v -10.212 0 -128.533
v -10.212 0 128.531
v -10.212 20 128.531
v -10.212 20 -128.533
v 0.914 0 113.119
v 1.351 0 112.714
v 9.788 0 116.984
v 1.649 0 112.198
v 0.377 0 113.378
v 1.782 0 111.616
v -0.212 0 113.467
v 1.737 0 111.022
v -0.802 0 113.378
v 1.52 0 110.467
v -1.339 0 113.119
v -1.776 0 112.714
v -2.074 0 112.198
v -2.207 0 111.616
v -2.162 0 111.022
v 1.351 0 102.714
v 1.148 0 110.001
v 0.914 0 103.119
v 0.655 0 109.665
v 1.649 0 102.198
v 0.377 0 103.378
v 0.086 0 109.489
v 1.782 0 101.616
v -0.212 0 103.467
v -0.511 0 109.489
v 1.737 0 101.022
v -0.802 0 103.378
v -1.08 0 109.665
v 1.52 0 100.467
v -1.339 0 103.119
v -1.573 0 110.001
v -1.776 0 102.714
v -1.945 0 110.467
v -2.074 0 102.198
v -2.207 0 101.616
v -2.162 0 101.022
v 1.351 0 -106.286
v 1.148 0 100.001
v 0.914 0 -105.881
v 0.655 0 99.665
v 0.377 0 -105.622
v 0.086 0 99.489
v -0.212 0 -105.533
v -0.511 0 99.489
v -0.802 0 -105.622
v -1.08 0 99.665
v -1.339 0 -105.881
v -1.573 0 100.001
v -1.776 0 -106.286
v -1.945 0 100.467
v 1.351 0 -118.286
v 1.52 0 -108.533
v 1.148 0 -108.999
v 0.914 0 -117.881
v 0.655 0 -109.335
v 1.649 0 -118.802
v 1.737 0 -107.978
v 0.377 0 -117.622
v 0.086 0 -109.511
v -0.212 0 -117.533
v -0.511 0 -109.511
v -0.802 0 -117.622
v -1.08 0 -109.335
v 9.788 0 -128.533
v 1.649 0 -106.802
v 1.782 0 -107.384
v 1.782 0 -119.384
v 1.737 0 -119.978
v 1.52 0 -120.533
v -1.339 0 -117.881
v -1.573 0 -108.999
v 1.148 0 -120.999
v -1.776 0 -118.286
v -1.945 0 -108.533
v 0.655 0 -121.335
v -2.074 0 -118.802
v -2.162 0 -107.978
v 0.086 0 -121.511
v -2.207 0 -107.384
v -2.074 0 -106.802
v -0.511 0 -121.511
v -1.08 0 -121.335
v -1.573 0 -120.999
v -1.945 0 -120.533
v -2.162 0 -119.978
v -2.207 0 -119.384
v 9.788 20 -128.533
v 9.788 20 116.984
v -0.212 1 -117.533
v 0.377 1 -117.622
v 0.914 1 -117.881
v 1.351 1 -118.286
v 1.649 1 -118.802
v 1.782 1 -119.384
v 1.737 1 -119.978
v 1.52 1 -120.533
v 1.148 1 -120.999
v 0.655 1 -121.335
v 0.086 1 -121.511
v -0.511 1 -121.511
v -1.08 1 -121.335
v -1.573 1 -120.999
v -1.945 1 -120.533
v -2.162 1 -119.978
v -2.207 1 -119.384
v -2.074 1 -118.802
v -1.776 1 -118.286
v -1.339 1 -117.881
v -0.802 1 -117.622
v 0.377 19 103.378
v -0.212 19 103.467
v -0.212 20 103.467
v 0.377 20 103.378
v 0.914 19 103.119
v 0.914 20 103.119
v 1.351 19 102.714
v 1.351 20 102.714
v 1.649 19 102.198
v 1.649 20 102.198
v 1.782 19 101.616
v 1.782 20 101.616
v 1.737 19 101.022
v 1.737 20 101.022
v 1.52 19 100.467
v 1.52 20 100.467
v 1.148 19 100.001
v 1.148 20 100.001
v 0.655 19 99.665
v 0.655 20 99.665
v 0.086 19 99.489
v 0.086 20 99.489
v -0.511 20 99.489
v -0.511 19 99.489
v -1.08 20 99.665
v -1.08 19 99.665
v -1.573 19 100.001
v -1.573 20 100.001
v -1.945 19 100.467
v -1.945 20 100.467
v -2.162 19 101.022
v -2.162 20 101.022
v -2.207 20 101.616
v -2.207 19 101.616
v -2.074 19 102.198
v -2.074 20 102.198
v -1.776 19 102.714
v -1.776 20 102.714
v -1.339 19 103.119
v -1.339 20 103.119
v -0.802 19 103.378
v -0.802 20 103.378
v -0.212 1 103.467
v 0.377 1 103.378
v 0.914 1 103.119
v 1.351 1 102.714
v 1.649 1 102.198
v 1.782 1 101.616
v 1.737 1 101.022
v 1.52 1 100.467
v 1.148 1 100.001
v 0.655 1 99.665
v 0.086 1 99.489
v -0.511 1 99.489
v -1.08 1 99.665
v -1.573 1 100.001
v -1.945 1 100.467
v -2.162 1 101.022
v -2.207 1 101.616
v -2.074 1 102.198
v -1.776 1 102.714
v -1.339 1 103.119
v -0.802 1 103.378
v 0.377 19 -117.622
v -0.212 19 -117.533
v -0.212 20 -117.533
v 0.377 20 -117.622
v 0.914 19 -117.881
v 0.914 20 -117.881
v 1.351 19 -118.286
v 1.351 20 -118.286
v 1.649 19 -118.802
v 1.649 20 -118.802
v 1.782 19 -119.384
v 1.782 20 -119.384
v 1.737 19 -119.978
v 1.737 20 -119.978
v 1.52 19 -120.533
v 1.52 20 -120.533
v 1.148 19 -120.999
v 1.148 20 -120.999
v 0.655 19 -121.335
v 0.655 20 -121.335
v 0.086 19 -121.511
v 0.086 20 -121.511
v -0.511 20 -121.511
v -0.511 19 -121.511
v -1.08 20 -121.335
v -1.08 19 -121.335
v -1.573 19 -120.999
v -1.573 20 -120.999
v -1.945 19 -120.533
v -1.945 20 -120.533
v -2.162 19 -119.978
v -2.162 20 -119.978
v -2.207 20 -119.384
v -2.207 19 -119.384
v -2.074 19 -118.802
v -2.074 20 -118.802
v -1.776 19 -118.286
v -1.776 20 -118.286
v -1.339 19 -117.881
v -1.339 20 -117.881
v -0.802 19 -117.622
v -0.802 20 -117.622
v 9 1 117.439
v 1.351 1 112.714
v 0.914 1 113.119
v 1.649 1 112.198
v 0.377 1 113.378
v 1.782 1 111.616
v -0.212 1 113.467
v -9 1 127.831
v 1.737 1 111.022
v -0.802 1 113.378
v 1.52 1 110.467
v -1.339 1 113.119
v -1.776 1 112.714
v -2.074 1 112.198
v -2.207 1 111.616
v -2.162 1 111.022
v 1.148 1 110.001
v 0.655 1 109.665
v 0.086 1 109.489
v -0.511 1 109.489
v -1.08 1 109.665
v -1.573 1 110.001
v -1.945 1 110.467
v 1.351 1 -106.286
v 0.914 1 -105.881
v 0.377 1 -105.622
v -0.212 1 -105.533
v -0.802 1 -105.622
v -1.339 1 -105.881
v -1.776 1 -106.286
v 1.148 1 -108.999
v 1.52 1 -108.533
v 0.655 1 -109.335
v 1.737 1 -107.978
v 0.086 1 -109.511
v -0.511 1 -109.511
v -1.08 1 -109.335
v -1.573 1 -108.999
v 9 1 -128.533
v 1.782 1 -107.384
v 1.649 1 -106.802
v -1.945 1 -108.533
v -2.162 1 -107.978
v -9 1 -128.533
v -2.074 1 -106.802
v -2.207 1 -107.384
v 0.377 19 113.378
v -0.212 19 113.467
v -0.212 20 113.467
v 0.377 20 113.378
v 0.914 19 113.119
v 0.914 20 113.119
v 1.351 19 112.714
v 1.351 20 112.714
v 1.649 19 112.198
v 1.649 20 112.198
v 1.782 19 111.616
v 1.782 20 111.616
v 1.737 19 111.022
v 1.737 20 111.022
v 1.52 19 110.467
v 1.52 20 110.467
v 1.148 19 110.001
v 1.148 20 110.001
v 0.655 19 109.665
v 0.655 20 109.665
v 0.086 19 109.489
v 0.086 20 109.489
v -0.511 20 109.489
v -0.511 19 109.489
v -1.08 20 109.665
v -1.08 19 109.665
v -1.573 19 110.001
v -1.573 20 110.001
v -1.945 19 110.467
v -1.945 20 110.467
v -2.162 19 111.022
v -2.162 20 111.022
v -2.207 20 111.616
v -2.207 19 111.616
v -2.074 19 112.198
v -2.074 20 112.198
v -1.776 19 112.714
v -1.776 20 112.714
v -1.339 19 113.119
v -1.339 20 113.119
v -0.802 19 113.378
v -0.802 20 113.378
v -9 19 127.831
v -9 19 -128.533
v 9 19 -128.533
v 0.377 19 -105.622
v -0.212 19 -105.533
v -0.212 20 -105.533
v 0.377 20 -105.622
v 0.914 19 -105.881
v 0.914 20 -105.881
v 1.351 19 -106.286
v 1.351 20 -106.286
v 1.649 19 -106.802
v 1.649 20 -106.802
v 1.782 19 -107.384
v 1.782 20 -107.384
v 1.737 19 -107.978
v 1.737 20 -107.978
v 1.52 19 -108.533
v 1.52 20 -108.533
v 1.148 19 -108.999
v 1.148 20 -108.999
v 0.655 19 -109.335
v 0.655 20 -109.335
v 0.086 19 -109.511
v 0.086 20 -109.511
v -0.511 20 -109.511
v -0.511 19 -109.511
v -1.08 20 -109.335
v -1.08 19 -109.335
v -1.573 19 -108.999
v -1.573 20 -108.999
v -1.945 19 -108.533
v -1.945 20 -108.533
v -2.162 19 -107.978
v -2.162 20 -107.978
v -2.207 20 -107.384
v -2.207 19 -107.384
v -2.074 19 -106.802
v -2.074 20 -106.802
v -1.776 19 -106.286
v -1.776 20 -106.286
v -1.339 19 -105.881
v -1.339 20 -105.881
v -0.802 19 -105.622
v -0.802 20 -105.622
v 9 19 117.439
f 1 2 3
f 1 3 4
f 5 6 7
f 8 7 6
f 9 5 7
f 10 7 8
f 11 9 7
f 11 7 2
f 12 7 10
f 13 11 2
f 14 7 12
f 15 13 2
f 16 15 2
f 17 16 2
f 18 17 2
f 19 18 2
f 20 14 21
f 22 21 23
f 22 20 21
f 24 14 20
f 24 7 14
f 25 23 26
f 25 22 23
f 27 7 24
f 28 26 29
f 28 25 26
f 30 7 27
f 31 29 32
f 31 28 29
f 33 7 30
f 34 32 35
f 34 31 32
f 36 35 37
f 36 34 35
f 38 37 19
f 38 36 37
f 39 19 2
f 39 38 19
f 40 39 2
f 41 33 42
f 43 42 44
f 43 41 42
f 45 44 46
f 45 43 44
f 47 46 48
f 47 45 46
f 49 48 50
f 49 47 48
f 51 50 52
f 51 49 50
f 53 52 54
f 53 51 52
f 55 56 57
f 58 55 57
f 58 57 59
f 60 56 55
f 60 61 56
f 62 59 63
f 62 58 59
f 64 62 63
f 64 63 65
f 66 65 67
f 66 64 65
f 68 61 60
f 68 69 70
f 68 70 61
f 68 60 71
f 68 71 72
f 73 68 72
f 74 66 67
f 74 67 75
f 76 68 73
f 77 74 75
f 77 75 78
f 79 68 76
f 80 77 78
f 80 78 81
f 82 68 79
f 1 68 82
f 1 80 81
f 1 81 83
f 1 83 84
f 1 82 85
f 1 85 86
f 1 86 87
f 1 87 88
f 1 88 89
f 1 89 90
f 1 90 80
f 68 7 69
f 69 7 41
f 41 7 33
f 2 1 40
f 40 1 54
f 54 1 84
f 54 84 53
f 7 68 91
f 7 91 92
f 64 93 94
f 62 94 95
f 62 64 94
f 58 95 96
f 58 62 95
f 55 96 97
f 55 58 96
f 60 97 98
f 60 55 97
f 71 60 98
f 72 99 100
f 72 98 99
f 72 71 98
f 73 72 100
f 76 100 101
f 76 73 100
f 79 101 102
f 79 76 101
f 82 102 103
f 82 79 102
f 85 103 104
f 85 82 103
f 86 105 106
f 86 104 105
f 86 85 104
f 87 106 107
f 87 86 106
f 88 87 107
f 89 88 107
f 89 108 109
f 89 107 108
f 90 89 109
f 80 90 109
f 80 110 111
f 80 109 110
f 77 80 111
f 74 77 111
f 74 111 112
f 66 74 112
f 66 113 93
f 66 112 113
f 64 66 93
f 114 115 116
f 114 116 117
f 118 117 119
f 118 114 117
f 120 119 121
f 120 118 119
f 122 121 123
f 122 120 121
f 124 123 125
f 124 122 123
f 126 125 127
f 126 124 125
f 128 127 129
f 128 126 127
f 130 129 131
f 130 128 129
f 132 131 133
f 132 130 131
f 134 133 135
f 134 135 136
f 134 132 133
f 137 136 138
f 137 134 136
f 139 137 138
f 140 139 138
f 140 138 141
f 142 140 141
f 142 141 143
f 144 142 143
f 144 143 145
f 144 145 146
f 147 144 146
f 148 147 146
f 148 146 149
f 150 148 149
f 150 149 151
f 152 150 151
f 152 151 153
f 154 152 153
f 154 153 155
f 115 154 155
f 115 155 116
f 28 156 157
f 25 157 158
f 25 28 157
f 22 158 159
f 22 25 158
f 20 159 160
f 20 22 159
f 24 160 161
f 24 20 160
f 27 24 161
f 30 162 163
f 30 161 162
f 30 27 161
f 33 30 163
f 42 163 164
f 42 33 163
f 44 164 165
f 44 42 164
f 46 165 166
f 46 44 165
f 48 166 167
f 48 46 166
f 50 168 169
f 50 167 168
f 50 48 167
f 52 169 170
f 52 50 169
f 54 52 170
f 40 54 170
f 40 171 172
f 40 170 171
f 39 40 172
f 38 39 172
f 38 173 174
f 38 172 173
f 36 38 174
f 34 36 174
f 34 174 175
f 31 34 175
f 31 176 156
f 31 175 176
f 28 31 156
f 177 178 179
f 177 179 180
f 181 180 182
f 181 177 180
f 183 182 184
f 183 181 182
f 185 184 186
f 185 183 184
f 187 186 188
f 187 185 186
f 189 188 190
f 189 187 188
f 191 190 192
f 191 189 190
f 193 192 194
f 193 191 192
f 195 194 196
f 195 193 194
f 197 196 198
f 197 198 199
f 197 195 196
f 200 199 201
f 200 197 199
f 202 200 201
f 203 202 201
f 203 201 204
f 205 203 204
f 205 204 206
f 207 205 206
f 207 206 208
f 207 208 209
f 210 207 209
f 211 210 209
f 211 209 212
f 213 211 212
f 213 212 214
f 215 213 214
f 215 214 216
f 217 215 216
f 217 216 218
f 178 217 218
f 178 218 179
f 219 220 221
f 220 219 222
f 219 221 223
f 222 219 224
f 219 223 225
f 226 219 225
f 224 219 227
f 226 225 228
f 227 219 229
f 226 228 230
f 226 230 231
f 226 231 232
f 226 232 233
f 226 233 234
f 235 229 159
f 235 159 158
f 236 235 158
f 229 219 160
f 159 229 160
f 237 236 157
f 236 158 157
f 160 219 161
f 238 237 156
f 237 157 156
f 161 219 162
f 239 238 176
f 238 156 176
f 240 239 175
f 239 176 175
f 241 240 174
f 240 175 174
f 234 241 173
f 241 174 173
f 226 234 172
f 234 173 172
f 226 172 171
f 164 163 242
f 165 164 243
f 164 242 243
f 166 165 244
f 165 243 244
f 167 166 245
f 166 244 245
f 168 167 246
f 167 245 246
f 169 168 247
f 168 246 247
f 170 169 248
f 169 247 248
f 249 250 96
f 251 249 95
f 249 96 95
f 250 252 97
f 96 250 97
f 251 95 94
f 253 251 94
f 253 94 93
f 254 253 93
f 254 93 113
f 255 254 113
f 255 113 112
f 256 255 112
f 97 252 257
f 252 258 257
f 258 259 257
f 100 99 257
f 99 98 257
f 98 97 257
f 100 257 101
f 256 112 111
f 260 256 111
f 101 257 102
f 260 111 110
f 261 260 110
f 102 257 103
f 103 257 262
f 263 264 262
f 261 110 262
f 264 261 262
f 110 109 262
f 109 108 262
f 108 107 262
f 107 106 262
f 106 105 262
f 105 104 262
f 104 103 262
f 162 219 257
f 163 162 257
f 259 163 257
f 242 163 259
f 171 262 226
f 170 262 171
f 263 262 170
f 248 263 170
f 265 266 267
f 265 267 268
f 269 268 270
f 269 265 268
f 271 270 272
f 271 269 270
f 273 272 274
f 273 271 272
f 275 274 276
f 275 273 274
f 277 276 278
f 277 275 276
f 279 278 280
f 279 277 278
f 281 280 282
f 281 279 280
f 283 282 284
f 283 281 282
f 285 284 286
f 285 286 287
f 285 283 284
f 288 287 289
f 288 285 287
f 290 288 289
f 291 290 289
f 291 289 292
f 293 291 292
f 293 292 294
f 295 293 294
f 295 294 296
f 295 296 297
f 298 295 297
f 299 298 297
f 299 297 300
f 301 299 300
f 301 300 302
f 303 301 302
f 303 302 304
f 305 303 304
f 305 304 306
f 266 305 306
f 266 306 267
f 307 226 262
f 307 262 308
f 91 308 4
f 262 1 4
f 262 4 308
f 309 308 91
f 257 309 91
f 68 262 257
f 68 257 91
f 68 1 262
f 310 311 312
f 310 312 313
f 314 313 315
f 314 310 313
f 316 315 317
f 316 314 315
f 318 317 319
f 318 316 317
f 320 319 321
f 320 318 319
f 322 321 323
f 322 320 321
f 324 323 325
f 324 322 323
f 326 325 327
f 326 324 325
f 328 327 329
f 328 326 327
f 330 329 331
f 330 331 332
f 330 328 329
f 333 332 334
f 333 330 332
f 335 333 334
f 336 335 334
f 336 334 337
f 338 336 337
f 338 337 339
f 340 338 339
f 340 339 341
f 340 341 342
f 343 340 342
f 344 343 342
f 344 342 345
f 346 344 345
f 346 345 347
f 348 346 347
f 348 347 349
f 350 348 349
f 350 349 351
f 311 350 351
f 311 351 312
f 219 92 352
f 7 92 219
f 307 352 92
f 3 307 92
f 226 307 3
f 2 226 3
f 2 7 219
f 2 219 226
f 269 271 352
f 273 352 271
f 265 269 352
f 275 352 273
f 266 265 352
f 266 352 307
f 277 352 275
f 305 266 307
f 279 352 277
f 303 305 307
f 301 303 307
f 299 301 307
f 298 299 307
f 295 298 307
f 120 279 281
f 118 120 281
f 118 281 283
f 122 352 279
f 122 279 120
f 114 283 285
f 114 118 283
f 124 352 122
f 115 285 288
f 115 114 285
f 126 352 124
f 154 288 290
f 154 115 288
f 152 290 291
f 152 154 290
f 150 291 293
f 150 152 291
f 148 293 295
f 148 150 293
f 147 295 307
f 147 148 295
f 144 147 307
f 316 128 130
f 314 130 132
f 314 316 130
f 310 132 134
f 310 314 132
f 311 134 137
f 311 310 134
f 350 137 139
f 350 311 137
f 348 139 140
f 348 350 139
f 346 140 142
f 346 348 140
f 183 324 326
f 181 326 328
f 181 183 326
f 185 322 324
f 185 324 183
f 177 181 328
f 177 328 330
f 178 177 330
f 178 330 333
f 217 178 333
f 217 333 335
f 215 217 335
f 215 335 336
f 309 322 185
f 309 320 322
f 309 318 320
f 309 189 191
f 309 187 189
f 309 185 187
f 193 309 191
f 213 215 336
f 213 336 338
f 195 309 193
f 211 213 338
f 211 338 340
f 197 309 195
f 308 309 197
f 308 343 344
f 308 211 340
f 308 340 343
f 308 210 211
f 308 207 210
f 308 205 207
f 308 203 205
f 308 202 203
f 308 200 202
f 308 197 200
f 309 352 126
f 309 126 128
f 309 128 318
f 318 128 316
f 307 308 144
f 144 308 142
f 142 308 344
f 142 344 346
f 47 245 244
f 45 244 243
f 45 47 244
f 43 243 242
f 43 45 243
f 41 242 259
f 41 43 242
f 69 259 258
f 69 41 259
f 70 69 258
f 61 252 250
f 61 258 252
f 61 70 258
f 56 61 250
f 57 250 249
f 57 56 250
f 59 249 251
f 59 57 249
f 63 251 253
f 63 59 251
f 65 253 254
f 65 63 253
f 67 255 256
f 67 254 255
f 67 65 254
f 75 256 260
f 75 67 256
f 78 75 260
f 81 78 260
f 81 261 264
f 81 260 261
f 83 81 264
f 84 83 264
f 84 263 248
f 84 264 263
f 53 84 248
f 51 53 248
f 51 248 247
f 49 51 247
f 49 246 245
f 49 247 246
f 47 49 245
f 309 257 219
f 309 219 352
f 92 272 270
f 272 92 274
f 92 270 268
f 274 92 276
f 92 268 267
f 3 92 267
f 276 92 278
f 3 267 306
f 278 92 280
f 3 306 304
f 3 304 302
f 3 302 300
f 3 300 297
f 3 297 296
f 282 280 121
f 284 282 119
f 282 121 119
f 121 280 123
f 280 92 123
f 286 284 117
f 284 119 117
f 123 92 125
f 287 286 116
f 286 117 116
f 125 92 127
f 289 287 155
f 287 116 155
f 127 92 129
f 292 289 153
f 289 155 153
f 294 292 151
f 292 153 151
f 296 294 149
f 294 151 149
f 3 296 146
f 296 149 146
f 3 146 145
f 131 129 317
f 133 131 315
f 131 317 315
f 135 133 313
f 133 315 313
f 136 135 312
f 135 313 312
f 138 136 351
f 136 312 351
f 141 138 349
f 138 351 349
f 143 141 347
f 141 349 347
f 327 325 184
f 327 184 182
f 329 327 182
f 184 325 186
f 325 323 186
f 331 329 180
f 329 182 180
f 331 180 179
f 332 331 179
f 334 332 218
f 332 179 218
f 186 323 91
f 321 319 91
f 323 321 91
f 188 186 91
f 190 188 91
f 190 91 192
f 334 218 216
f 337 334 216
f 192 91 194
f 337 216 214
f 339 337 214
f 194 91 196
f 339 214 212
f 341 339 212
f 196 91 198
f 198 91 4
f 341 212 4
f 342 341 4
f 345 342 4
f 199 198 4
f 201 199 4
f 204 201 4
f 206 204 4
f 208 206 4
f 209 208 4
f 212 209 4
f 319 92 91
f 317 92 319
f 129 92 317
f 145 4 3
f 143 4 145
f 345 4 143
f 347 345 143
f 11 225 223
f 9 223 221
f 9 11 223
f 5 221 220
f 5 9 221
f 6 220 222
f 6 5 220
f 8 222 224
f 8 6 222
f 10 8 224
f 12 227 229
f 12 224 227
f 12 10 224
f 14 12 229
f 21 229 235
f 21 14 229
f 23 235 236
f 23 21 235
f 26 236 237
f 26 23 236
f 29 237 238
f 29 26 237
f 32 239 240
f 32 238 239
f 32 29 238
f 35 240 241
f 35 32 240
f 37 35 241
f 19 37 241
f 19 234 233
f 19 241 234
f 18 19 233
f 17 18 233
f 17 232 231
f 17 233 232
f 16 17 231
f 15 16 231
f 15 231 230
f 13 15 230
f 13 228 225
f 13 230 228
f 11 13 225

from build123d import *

# Parameters (mm, degrees)
SKETCH_1_R          = 2
EXTRUDE_1_DEPTH     = 20
SKETCH_2_W          = 18
SKETCH_2_H          = 18
CUT_EXTRUDE_1_DEPTH = 259.043348145


with BuildPart() as part:
    # 草图1 → 凸台-拉伸1 (new body)
    with BuildSketch(Plane(origin=(0, 0, 0), x_dir=(1, 0, 0), z_dir=(0, 1, 0))):
        Polygon((-10.212466243, 128.533123378), (9.787533757, 128.533123378), (9.787533757, -116.984211541), (-10.212466243, -128.531216924), align=None)
        with Locations(Location((-0.212466243, -111.466876622, 0), (0, 0, 270))):
            Circle(SKETCH_1_R, mode=Mode.SUBTRACT)
        with Locations(Location((-0.212466243, -101.466876622, 0), (0, 0, 270))):
            Circle(SKETCH_1_R, mode=Mode.SUBTRACT)
        with Locations(Location((-0.212466243, 107.533123378, 0), (0, 0, 270))):
            Circle(SKETCH_1_R, mode=Mode.SUBTRACT)
        with Locations(Location((-0.212466243, 119.533123378, 0), (0, 0, 270))):
            Circle(SKETCH_1_R, mode=Mode.SUBTRACT)
    extrude(amount=EXTRUDE_1_DEPTH)

    # 草图2 → 切除-拉伸1 (cut, through all)
    with BuildSketch(Plane(origin=(0, 0, -128.533123378), x_dir=(-1, 0, 0), z_dir=(0, 0, -1))):
        with Locations((0, 10)):
            Rectangle(SKETCH_2_W, SKETCH_2_H)
    extrude(amount=-CUT_EXTRUDE_1_DEPTH, mode=Mode.SUBTRACT)


solid = part.part
